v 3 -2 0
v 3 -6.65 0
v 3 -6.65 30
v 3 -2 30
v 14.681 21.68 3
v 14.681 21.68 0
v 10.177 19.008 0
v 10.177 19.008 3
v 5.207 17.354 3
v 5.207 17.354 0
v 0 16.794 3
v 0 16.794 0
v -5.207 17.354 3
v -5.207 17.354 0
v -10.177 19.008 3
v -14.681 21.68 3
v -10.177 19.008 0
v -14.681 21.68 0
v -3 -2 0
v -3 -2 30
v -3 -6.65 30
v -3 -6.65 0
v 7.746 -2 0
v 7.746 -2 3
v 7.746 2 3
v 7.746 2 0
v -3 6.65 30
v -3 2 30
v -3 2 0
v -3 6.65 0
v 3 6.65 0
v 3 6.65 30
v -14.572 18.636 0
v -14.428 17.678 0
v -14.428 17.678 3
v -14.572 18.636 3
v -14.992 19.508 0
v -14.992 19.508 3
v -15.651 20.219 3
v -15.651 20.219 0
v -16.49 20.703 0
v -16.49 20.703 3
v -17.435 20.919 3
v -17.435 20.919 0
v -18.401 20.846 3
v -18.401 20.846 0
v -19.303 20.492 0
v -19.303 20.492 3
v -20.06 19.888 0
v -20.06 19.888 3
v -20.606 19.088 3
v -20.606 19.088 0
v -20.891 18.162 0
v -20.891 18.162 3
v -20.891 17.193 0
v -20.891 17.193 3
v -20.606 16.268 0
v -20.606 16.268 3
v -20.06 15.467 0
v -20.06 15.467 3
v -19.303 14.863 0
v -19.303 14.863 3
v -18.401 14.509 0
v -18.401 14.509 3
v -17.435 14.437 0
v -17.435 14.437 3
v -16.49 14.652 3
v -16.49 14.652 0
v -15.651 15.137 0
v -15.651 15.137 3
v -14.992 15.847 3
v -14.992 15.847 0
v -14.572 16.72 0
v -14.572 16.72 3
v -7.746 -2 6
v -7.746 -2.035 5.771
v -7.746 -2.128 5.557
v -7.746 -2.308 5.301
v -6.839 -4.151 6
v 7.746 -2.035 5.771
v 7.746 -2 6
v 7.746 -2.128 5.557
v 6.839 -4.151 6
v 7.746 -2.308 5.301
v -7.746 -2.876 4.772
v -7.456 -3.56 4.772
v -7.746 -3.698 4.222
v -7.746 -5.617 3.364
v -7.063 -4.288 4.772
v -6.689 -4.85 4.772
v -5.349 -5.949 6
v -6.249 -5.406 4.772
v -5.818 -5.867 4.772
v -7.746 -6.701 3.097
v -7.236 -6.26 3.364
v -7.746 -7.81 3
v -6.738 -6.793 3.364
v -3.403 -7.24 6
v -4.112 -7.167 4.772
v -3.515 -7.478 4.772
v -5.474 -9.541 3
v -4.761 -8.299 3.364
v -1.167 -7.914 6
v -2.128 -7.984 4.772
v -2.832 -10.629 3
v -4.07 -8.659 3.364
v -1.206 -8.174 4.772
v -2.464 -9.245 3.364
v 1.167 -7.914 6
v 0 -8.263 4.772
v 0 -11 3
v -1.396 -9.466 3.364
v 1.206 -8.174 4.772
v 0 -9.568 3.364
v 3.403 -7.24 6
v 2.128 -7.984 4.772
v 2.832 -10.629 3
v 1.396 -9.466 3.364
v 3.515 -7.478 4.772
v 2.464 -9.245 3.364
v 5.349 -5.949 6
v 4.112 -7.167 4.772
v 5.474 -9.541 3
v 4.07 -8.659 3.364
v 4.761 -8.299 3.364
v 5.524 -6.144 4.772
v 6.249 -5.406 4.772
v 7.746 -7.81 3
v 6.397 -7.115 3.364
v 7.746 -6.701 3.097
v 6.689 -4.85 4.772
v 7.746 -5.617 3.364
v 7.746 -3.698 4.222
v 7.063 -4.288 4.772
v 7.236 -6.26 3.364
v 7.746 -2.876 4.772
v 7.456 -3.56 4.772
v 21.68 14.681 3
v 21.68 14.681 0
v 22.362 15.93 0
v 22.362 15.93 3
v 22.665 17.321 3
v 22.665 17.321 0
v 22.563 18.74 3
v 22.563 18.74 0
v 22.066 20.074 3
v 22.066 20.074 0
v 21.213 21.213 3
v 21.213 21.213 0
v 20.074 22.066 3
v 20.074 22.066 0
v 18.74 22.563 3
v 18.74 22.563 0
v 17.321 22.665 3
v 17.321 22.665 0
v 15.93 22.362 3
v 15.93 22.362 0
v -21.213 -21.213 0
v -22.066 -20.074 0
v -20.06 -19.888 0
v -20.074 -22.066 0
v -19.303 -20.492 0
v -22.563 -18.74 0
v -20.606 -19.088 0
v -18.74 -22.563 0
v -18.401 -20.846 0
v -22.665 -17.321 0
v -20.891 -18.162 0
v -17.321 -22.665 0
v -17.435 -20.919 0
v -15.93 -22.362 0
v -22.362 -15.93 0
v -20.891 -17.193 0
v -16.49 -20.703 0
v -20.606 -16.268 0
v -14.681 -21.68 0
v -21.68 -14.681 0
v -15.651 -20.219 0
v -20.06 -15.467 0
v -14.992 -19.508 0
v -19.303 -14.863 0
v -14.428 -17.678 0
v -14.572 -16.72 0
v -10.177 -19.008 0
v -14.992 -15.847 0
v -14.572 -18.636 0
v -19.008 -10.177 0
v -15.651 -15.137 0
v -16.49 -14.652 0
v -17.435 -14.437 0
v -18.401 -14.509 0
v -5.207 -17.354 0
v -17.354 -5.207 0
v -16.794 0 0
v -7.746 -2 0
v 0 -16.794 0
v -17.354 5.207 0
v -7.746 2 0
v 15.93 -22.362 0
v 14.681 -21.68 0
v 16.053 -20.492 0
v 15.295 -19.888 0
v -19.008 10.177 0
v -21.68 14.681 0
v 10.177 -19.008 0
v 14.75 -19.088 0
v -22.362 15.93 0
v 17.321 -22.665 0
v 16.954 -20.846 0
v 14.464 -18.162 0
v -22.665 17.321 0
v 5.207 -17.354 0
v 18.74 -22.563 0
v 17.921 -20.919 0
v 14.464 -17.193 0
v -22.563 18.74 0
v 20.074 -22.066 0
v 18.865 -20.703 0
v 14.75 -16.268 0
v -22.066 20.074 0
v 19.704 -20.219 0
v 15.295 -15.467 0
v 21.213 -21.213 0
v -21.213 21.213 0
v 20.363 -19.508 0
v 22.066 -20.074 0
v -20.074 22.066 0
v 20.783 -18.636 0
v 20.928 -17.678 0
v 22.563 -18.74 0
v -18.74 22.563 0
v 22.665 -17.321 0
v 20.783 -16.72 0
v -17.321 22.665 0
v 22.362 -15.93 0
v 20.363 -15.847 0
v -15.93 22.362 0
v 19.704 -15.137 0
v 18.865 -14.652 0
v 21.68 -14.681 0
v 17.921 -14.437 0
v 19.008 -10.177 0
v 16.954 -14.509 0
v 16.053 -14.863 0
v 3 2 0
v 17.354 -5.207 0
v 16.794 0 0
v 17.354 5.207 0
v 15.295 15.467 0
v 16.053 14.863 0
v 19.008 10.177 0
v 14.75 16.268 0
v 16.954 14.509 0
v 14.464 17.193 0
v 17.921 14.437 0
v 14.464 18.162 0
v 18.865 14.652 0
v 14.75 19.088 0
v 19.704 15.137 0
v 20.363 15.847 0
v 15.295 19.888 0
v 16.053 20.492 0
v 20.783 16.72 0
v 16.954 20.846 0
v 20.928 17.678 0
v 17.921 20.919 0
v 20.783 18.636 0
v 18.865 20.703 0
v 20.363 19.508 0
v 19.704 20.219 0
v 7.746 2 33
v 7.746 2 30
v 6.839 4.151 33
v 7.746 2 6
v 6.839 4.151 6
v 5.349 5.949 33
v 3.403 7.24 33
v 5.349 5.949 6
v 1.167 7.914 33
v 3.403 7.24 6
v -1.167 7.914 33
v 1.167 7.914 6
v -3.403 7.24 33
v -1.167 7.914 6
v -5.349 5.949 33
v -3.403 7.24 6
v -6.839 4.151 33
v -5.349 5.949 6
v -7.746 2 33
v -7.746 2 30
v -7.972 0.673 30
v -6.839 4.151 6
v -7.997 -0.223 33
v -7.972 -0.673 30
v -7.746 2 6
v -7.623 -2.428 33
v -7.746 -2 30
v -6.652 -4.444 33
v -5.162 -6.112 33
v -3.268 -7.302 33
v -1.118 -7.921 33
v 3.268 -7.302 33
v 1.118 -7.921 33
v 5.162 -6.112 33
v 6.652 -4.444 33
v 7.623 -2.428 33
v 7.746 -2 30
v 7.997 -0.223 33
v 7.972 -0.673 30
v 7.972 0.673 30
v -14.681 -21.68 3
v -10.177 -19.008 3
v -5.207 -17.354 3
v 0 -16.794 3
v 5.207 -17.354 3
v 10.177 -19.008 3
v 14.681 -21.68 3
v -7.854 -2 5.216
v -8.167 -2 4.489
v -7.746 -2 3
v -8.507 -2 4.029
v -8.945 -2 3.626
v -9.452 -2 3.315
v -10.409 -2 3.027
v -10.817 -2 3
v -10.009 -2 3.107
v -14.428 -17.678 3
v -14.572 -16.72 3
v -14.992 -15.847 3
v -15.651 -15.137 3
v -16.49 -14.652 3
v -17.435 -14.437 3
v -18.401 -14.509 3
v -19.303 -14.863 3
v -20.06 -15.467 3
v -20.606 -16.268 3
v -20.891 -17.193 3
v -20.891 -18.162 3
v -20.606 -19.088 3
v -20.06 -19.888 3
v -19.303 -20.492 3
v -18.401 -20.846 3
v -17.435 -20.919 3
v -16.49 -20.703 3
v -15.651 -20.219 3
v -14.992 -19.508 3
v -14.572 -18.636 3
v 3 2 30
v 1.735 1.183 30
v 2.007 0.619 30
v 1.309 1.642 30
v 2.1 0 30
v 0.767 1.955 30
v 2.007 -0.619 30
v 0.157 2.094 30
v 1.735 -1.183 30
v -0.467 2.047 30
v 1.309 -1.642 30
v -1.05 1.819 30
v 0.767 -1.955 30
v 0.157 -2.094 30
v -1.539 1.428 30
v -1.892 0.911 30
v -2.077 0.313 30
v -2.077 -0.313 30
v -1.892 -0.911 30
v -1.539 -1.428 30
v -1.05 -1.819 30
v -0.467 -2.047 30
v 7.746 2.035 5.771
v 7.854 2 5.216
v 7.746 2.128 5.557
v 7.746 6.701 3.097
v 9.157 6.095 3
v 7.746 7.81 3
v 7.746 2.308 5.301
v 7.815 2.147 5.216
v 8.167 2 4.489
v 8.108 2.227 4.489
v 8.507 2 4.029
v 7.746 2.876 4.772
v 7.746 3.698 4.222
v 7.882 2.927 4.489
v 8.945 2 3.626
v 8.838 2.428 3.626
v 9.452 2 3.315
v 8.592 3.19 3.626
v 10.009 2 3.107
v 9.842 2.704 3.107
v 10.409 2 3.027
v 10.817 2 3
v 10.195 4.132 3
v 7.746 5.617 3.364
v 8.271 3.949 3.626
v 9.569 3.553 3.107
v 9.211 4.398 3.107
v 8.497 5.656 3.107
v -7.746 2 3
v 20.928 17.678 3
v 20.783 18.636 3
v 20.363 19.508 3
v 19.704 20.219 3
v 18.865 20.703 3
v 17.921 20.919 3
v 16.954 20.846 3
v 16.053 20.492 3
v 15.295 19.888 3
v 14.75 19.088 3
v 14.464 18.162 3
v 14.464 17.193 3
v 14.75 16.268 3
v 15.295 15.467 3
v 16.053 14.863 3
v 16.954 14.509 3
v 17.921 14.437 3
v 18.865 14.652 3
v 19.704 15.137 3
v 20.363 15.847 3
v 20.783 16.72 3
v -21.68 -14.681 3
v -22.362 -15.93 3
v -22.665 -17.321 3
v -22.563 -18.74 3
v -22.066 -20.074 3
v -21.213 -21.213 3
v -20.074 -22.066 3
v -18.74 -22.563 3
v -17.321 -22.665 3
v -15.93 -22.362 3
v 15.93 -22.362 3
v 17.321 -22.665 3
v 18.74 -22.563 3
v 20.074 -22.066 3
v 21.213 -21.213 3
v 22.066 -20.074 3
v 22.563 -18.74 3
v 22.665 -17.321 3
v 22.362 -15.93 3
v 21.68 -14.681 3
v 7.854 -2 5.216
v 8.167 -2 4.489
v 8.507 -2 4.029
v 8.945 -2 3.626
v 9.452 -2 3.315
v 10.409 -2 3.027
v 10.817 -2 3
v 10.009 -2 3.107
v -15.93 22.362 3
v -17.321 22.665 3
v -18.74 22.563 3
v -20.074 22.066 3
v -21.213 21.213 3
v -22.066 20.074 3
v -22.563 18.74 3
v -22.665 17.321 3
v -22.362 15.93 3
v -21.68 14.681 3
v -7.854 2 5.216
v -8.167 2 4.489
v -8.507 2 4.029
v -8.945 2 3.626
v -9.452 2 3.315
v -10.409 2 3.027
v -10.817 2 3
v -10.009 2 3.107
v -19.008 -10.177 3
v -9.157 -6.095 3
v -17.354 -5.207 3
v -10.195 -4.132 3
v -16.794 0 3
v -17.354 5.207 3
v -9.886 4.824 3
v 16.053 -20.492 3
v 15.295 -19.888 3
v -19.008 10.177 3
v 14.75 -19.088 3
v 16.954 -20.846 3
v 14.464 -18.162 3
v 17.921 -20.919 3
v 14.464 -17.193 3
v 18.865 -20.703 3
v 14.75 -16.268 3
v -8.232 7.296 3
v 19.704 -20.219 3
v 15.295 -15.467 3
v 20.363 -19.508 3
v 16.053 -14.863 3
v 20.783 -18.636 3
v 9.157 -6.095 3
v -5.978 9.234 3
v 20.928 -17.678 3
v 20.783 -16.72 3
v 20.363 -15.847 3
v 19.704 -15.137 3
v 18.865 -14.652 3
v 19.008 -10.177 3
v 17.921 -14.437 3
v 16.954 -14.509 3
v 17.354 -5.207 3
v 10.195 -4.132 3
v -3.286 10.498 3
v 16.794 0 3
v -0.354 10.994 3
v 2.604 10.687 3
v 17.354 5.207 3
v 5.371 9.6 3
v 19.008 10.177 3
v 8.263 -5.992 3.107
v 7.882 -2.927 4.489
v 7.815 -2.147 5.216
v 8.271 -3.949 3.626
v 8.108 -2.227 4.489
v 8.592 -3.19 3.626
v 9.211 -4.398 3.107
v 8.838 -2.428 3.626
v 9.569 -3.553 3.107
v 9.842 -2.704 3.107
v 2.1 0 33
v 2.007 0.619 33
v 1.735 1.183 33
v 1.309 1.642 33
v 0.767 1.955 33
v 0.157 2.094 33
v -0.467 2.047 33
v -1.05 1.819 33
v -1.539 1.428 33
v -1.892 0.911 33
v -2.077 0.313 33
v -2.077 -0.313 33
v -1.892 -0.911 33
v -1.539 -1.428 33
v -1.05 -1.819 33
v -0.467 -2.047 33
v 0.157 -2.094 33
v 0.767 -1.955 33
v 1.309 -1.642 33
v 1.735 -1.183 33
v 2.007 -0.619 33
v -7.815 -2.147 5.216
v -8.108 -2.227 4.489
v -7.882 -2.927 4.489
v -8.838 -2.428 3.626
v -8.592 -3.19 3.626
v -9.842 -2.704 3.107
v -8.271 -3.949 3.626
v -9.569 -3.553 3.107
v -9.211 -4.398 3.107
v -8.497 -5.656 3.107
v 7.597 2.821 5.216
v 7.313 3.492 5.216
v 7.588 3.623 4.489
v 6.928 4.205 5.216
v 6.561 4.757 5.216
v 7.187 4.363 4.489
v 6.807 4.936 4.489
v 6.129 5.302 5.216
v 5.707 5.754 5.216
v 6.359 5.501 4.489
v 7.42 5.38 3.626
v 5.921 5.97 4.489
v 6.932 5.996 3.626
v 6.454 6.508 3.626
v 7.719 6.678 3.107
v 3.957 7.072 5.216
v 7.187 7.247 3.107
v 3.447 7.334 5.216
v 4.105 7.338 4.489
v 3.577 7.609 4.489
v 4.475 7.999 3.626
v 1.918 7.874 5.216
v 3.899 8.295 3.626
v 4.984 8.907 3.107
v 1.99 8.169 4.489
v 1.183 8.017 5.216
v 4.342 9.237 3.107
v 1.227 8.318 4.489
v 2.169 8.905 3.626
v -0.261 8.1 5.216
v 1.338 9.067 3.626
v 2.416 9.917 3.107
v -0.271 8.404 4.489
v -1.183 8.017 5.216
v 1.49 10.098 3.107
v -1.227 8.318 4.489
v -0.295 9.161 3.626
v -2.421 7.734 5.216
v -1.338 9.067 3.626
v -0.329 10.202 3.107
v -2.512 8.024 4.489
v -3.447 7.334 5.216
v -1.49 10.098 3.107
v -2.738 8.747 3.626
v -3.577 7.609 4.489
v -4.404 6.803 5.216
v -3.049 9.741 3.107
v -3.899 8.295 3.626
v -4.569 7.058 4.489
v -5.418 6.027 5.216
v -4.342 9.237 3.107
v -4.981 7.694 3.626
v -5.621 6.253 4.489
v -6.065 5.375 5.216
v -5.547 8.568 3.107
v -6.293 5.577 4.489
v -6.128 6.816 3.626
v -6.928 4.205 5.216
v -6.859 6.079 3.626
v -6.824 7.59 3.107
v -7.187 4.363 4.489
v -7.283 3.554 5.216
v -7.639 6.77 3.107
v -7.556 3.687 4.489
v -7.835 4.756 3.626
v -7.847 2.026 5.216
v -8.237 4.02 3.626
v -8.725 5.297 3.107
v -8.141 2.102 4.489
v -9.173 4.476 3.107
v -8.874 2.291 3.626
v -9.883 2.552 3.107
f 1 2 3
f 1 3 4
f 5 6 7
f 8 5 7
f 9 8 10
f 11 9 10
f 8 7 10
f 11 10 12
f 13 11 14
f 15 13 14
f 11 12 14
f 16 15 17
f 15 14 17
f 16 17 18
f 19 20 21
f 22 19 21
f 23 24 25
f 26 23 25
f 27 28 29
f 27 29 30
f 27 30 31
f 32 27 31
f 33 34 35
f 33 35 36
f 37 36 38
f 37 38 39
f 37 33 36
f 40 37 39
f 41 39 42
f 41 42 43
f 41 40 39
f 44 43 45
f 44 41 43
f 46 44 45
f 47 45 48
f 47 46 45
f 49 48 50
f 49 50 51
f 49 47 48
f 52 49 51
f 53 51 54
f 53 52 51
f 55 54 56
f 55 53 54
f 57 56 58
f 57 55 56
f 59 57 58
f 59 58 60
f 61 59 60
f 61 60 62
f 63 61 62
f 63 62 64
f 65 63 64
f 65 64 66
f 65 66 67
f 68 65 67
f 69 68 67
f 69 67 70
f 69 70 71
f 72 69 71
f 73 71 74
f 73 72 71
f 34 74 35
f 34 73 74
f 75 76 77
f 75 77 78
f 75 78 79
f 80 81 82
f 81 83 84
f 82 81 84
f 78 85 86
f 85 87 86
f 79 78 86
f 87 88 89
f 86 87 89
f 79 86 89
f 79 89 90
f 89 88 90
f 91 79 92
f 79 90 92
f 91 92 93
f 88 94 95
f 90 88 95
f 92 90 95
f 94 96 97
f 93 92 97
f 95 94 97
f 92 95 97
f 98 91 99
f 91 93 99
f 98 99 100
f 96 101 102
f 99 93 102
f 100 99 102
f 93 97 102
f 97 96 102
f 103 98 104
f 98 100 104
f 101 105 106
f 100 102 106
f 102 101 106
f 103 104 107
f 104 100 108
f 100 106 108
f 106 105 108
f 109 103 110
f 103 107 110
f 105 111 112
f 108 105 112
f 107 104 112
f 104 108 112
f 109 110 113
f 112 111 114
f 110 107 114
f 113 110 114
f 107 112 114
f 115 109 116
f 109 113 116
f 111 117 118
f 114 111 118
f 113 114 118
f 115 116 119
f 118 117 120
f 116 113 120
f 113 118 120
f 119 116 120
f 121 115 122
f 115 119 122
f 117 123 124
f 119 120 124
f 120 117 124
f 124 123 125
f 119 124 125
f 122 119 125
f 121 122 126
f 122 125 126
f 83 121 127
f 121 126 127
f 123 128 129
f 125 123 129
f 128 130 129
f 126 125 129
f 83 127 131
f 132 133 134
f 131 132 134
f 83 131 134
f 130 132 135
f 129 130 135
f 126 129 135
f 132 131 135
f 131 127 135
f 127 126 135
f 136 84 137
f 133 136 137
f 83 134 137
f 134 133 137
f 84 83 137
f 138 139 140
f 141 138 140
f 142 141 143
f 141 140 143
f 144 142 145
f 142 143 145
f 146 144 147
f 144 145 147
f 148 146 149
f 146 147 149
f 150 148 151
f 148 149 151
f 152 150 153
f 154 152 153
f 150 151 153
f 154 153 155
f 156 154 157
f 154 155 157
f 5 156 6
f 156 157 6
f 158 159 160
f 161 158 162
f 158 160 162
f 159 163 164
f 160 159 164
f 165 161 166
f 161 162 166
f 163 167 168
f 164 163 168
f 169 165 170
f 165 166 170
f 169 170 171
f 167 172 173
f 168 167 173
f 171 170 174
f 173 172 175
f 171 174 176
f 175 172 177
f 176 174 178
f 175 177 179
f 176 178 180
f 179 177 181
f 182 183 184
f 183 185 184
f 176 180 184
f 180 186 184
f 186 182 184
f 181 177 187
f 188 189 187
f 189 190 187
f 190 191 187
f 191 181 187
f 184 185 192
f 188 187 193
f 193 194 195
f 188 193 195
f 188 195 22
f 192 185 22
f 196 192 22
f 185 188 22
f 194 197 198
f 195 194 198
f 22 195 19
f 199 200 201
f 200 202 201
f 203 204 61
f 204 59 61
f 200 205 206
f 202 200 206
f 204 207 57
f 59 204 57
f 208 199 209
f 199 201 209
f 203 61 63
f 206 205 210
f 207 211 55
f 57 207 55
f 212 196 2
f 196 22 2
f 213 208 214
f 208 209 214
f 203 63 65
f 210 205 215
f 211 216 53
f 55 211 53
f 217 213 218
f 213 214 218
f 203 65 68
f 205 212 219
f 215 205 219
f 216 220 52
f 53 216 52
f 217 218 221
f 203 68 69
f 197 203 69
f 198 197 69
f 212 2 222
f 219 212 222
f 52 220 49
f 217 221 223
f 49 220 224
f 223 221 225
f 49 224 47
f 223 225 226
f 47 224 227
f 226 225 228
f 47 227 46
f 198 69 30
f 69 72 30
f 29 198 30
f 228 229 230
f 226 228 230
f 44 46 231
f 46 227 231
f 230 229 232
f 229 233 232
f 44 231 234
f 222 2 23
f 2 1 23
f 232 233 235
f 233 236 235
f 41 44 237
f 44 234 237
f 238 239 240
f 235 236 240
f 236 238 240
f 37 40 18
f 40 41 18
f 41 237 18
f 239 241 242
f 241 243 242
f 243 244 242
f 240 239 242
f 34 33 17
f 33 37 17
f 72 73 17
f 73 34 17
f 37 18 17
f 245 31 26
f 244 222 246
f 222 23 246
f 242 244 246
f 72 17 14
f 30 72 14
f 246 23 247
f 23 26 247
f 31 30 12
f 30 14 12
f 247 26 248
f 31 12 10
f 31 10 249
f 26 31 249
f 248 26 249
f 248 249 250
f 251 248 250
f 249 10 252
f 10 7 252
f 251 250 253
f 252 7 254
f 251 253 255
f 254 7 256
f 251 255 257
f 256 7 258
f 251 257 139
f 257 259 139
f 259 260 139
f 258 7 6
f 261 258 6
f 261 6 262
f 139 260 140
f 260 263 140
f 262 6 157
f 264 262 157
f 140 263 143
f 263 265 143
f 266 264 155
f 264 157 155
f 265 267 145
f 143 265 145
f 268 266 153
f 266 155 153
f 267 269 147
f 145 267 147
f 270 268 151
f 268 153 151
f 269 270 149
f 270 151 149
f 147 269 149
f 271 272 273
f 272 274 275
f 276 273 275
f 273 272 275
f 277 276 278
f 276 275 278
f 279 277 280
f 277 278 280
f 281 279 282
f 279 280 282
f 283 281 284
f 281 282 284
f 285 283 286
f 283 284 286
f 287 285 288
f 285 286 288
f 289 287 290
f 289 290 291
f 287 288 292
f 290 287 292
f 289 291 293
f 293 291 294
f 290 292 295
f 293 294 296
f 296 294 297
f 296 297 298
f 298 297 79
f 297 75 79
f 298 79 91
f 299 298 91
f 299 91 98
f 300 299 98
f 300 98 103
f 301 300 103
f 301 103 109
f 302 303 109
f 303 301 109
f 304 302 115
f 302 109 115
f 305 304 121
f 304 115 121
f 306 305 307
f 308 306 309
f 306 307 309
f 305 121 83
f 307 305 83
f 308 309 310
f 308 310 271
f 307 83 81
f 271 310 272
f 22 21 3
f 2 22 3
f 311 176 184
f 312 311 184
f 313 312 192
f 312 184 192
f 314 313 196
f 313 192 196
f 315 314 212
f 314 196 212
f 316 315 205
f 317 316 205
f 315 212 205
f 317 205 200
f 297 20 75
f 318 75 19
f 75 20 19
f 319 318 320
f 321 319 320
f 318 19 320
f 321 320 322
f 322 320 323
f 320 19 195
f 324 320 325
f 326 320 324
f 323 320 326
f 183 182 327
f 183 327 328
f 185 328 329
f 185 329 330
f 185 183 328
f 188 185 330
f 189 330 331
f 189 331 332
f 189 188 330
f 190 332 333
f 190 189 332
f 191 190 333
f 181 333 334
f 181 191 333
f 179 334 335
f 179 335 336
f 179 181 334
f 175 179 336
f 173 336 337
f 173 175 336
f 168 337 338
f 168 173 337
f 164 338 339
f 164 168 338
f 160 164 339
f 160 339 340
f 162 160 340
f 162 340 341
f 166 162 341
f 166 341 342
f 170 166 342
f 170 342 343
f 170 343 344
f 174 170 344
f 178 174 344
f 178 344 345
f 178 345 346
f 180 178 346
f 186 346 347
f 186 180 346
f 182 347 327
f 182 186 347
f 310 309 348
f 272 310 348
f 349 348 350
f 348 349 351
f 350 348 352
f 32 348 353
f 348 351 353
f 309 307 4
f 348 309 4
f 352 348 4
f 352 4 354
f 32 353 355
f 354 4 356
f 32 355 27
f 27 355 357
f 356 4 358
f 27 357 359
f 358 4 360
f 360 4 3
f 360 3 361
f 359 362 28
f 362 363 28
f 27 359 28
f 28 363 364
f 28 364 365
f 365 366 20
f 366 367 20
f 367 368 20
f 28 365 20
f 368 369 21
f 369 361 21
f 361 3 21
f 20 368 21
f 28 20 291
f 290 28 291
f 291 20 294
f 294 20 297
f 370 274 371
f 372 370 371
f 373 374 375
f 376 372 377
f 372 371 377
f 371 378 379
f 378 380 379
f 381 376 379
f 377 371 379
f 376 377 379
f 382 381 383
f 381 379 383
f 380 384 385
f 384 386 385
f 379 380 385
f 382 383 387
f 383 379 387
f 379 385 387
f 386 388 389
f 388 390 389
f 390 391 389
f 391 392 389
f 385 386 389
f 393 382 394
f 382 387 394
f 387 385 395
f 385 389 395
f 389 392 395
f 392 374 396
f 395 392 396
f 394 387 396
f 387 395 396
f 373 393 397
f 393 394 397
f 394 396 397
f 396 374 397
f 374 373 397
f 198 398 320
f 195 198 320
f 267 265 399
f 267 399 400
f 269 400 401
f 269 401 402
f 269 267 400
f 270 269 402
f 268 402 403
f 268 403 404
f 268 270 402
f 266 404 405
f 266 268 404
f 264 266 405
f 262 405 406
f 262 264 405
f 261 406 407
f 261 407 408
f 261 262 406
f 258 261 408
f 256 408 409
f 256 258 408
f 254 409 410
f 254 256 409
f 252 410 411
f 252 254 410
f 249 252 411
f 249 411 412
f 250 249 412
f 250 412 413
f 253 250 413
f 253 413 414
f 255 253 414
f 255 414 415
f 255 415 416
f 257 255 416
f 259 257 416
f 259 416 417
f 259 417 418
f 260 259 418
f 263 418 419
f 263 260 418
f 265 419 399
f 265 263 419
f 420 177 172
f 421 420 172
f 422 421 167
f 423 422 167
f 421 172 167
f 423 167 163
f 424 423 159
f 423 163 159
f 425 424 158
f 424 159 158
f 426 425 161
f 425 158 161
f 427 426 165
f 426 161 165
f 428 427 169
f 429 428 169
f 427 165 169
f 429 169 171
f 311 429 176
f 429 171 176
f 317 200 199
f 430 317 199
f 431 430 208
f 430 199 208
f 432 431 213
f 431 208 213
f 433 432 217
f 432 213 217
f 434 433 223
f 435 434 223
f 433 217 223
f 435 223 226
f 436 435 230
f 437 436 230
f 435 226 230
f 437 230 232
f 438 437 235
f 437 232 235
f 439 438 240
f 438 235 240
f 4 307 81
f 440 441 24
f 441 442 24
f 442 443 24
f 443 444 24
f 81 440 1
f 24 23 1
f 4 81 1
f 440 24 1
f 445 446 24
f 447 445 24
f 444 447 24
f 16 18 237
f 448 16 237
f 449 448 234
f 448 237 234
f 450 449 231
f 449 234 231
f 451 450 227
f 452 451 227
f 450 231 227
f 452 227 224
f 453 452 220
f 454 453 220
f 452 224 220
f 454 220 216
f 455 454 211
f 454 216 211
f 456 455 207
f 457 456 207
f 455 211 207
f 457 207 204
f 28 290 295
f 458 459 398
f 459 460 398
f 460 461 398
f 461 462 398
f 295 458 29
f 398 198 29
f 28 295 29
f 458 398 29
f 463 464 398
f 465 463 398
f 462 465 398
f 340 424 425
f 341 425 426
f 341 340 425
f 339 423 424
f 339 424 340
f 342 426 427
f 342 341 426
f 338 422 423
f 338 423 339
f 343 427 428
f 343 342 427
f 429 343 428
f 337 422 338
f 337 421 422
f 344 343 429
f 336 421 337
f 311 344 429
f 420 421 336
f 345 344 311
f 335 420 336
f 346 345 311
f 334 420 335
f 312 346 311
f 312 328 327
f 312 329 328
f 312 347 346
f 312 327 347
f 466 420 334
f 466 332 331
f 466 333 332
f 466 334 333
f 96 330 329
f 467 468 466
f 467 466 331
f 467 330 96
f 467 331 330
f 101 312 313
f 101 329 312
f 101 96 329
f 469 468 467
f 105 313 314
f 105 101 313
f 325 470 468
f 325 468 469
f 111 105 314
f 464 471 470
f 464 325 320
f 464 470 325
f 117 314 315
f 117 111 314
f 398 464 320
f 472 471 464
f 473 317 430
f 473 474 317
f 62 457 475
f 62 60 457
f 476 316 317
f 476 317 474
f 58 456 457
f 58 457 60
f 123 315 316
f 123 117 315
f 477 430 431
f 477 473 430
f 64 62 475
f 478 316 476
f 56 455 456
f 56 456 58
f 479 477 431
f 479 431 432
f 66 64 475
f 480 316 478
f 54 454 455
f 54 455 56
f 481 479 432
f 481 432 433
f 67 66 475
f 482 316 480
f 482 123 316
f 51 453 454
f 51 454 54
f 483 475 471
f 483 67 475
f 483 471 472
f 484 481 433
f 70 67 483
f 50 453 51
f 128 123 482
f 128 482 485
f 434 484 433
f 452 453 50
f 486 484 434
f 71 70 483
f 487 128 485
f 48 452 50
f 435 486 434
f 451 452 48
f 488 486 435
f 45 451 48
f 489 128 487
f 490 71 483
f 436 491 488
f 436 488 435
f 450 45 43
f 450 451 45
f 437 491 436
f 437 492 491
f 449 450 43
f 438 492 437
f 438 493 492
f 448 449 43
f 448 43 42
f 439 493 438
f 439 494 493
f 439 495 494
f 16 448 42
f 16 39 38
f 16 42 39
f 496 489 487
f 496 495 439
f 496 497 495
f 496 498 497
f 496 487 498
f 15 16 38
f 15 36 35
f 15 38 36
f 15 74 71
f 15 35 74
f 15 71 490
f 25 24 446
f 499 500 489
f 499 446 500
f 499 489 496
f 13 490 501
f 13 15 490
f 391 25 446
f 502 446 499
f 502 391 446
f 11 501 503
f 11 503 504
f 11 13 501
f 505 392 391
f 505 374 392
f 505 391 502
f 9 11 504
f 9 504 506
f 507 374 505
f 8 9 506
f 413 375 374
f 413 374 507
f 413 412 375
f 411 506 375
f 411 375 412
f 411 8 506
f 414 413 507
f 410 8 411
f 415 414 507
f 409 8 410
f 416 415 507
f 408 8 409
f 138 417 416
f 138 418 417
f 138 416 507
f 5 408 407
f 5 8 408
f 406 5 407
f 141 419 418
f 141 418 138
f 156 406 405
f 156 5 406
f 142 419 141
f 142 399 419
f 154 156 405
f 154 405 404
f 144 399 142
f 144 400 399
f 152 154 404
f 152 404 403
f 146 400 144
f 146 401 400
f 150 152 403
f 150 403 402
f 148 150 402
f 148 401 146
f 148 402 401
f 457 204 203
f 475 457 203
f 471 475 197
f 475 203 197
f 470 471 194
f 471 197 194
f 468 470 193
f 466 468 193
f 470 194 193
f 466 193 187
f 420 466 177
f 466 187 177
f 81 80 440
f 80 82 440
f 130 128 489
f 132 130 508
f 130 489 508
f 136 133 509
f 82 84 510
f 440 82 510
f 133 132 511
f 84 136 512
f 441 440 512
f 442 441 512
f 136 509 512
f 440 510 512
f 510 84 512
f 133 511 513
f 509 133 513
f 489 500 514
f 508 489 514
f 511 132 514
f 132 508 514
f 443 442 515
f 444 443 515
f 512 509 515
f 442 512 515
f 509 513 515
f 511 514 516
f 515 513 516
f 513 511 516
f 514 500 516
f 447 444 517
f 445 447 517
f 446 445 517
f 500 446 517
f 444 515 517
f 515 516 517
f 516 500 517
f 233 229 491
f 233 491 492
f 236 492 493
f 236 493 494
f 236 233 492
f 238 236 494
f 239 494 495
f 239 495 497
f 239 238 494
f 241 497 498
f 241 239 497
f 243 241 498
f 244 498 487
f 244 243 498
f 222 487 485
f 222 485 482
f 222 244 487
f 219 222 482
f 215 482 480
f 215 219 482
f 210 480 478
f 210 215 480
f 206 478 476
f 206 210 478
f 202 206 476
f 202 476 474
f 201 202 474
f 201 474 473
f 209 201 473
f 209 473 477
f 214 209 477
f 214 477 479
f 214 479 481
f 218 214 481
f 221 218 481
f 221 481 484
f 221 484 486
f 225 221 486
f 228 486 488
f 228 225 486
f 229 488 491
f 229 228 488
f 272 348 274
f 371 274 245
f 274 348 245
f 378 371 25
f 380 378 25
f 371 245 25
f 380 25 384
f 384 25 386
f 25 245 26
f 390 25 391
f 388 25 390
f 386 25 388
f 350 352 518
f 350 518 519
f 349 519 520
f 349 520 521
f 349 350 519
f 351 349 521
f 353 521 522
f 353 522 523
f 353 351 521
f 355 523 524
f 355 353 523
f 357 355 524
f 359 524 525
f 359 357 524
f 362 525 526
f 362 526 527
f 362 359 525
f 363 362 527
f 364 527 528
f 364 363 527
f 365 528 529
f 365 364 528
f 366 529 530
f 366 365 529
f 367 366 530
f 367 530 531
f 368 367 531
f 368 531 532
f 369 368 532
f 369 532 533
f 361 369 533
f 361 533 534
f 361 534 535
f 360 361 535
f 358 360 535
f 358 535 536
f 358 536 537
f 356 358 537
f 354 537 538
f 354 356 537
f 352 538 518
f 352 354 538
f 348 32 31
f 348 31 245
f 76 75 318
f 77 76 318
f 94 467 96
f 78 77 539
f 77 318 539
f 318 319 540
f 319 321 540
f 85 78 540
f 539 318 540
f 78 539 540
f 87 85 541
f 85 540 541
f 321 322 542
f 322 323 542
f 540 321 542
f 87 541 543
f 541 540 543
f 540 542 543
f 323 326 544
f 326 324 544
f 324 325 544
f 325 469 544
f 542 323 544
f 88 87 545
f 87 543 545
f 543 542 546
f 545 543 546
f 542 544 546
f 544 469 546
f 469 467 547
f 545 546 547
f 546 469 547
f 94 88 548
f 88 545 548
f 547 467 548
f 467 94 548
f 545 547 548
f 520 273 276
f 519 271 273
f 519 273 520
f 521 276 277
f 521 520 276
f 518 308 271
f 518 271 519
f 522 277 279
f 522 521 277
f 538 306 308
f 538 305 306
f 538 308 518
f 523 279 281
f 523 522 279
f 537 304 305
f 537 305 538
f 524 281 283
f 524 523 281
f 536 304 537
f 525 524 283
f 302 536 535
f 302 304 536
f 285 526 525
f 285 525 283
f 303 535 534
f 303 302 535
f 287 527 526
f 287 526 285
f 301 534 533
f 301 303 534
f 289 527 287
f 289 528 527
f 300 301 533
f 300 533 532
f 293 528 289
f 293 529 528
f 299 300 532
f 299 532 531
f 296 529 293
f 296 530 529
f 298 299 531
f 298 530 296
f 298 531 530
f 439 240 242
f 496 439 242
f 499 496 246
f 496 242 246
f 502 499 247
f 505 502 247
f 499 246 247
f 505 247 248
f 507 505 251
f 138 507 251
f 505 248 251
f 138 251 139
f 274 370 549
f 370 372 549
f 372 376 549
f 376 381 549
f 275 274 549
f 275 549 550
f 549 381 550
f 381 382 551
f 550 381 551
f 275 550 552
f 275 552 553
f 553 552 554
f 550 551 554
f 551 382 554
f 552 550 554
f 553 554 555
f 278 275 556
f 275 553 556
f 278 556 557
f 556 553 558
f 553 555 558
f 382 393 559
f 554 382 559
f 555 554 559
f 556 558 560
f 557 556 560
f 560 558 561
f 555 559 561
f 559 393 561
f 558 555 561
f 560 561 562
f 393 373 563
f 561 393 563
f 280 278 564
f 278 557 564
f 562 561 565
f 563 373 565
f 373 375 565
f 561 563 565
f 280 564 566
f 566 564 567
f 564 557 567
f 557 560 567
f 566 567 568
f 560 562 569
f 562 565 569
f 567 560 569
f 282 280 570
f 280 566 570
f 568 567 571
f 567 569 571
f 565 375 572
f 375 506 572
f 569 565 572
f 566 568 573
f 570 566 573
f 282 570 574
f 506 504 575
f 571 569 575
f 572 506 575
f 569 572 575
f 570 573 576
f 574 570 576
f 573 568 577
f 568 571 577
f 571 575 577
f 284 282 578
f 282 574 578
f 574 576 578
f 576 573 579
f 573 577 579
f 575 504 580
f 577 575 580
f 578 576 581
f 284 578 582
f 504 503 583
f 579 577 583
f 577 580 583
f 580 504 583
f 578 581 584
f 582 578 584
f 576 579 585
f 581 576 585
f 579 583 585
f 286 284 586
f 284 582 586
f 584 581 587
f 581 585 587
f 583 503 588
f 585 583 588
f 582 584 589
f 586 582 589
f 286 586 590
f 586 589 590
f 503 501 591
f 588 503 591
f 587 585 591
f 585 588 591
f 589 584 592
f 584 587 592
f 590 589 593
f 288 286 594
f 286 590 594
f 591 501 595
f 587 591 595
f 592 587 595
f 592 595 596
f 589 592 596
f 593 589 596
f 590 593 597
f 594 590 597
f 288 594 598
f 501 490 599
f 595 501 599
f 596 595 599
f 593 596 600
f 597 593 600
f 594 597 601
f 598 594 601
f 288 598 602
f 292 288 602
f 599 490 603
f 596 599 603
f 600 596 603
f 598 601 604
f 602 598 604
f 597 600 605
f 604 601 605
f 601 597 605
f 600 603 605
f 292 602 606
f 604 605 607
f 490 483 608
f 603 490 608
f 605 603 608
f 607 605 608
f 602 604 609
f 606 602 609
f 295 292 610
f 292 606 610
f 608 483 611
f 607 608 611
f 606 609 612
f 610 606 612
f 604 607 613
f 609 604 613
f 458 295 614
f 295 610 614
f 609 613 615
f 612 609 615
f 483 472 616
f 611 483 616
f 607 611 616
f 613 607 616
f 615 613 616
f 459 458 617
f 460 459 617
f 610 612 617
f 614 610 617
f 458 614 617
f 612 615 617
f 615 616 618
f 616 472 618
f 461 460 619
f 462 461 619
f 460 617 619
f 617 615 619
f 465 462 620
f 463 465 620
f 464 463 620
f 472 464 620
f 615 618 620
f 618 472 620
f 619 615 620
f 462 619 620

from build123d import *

# Parameters (mm, degrees)
CROQUIS1_R              = 3.2499999999997446
CROQUIS1_R_2            = 3.249999999997429
CROQUIS1_R_3            = 3.249999999998684
SALIENTE_EXTRUIR1_DEPTH = 3
CORTAR_EXTRUIR2_REACH   = 34.211
SALIENTE_EXTRUIR2_DEPTH = 30
SALIENTE_EXTRUIR3_START = -3
CROQUIS4_R              = 8.000000000001583
CROQUIS4_R_2            = 2.1
SALIENTE_EXTRUIR3_DEPTH = 3
REDONDEO1_R             = 3


with BuildPart() as part:
    # Croquis1 → Saliente-Extruir1 (new body)
    with BuildSketch(Plane.XY):
        with BuildLine():
            ThreePointArc((-14.681197845286842, 21.680313336544412), (-21.21320343559782, 21.213203435599436), (-21.680313336542973, 14.681197845289143))
            ThreePointArc((-21.680313336542973, 14.681197845289143), (-16.79377171834698, -4.4873e-13), (-21.680313336546256, -14.681197845289011))
            ThreePointArc((-21.680313336546256, -14.681197845289011), (-21.213203435602523, -21.213203435600768), (-14.68119784529118, -21.680313336546952))
            ThreePointArc((-14.68119784529118, -21.680313336546952), (-1.37456e-12, -16.793771718350733), (14.681197845287352, -21.68031333655022))
            ThreePointArc((14.681197845287352, -21.68031333655022), (21.21320343559837, -21.213203435605198), (21.680313336544117, -14.68119784529431))
            ThreePointArc((21.680313336544117, -14.68119784529431), (16.79377171834798, -4.8379e-12), (21.680313336547112, 14.681197845283641))
            ThreePointArc((21.680313336547112, 14.681197845283641), (21.213203435602864, 21.21320343559648), (14.681197845291681, 21.680313336541143))
            ThreePointArc((14.681197845291681, 21.680313336541143), (1.87813e-12, 16.793771718344924), (-14.681197845286842, 21.680313336544412))
        make_face()
        with Locations((-17.677669529663632, 17.677669529664712)):
            Circle(CROQUIS1_R, mode=Mode.SUBTRACT)
        with Locations((17.67766952966688, 17.677669529661795)):
            Circle(CROQUIS1_R_2, mode=Mode.SUBTRACT)
        with Locations((17.67766952966414, -17.677669529670524)):
            Circle(CROQUIS1_R_3, mode=Mode.SUBTRACT)
        with Locations((-17.677669529667213, -17.677669529666943)):
            Circle(CROQUIS1_R, mode=Mode.SUBTRACT)
    extrude(amount=SALIENTE_EXTRUIR1_DEPTH)

    # Croquis2 → Cortar-Extruir2 (cut, up to next)
    with BuildSketch(Plane.XY.offset(3), mode=Mode.PRIVATE) as cortar_extruir2_sk1:
        Polygon((3.0000001045733526, -6.64999997299992), (3.000000062696712, -2.0000000028022047), (7.7459667027131305, -1.9999999600613383), (7.745966666690224, 2.00000009954332), (3.000000026673777, 2.000000056802398), (2.999999984797136, 6.650000027000114), (-3.0000001046098235, 6.649999972965725), (-3.000000062733182, 2.00000000276801), (-7.745966702749602, 1.9999999600271434), (-7.7459666821165225, -2.00000003997286), (-3.000000026710248, -1.9999999972319937), (-2.9999999848336065, -6.6500000270343085), align=None)
    cortar_extruir2_tool1 = extrude(cortar_extruir2_sk1.sketch, amount=-CORTAR_EXTRUIR2_REACH, mode=Mode.PRIVATE) & part.part
    add(cortar_extruir2_tool1.solids().sort_by_distance((0, 0, 3))[0], mode=Mode.SUBTRACT)

    # Croquis3 → Saliente-Extruir2 (add)
    with BuildSketch(Plane.XY.offset(3)):
        with BuildLine():
            Line((3.000000026673777, 2.000000056802398), (7.745966666690224, 2.00000009954332))
            ThreePointArc((7.7459666667244, 2.000000099552144), (-7.205040071e-08, 8.000000000013381), (-7.745966702749601, 1.9999999600271456))
            Line((-7.745966702749602, 1.9999999600271434), (-3.000000062733182, 2.00000000276801))
            Line((-3.000000062733182, 2.00000000276801), (-3.0000001046098235, 6.649999972965725))
            Line((-3.000000104609824, 6.649999972965725), (2.999999984797136, 6.650000027000114))
            Line((2.999999984797136, 6.650000027000113), (3.000000026673777, 2.000000056802398))
        make_face()
        with BuildLine():
            Line((3.000000062696712, -2.0000000028022047), (3.0000001045733526, -6.64999997299992))
            Line((3.0000001045733526, -6.64999997299992), (-2.9999999848336065, -6.6500000270343085))
            Line((-2.9999999848336065, -6.6500000270343085), (-3.000000026710248, -1.9999999972319937))
            Line((-3.0000000267102482, -1.9999999972319937), (-7.7459666821165225, -2.00000003997286))
            ThreePointArc((-7.745966682108257, -2.000000039970724), (4.126157047e-08, -8.000000000013381), (7.745966702739044, -1.9999999600680332))
            Line((7.7459667027131305, -1.9999999600613383), (3.000000062696712, -2.0000000028022047))
        make_face()
    extrude(amount=SALIENTE_EXTRUIR2_DEPTH)

    # Croquis4 → Saliente-Extruir3 (add)
    with BuildSketch(Plane.XY.offset(33).offset(SALIENTE_EXTRUIR3_START)):
        with Locations(Location((0, 0, 0), (0, 0, 165.52248811))):
            Circle(CROQUIS4_R)
        Circle(CROQUIS4_R_2, mode=Mode.SUBTRACT)
    extrude(amount=SALIENTE_EXTRUIR3_DEPTH)

    # Redondeo1
    # the kernel refuses this fillet: 3 mm, written as the material it adds along each edge
    with BuildSketch(Plane(origin=(4.4e-16, 4.4e-16, 3), x_dir=(-0.22595414891367588, 0.9741379381733866, 0), z_dir=(0.9741379381733866, 0.22595414891367588, 0))) as redondeo1_piece_1_section:
        with BuildLine():
            CenterArc((8.000000000013381 + REDONDEO1_R, REDONDEO1_R), REDONDEO1_R, 180, 90)
            Line((8.000000000013383, REDONDEO1_R), (8.000000000013381, 0))
            Line((8.000000000013381, 0), (8.000000000013381 + REDONDEO1_R, 0))
        make_face()
    redondeo1_piece_1 = revolve(axis=Axis((4.4e-16, 4.4e-16, 3), (0, 0, 1)), revolution_arc=333.88201682059855, mode=Mode.PRIVATE)
    redondeo1_piece_1 = split(redondeo1_piece_1, bisect_by=Plane(origin=(-7.745966692433063, -3.99557857e-08, 3), z_dir=(1.0, 5.158269811289524e-09, 0)), keep=Keep.TOP, mode=Mode.PRIVATE)
    redondeo1_piece_1 = split(redondeo1_piece_1, bisect_by=Plane(origin=(7.745966684701678, 6.975805769e-08, 3), z_dir=(-1.0, -9.005726474694729e-09, 0)), keep=Keep.TOP, mode=Mode.PRIVATE)
    add(redondeo1_piece_1)
    with BuildSketch(Plane(origin=(4.4e-16, 4.4e-16, 3), x_dir=(-0.22595414891367588, 0.9741379381733866, 0), z_dir=(0.9741379381733866, 0.22595414891367588, 0))) as redondeo1_piece_2_section:
        with BuildLine():
            CenterArc((8.000000000013381 + REDONDEO1_R, REDONDEO1_R), REDONDEO1_R, 180, 90)
            Line((8.000000000013383, REDONDEO1_R), (8.000000000013381, 0))
            Line((8.000000000013381, 0), (8.000000000013381 + REDONDEO1_R, 0))
        make_face()
    redondeo1_piece_2 = revolve(axis=Axis((4.4e-16, 4.4e-16, 3), (0, 0, 1)), revolution_arc=333.88201682059855, mode=Mode.PRIVATE)
    redondeo1_piece_2 = split(redondeo1_piece_2, bisect_by=Plane(origin=(-1.801144813e-08, 2.0000000297851828, 3), z_dir=(-9.005724153490957e-09, 1.0, 0)), keep=Keep.TOP, mode=Mode.PRIVATE)
    add(redondeo1_piece_2)
    with BuildSketch(Plane(origin=(4.4e-16, 4.4e-16, 3), x_dir=(-0.22595414891367588, 0.9741379381733866, 0), z_dir=(0.9741379381733866, 0.22595414891367588, 0))) as redondeo1_piece_3_section:
        with BuildLine():
            CenterArc((8.000000000013381 + REDONDEO1_R, REDONDEO1_R), REDONDEO1_R, 180, 90)
            Line((8.000000000013383, REDONDEO1_R), (8.000000000013381, 0))
            Line((8.000000000013381, 0), (8.000000000013381 + REDONDEO1_R, 0))
        make_face()
    redondeo1_piece_3 = revolve(axis=Axis((4.4e-16, 4.4e-16, 3), (0, 0, 1)), revolution_arc=333.88201682059855, mode=Mode.PRIVATE)
    redondeo1_piece_3 = split(redondeo1_piece_3, bisect_by=Plane(origin=(1.801144902e-08, -2.0000000298193776, 3), z_dir=(9.005724153490959e-09, -1.0, 0)), keep=Keep.TOP, mode=Mode.PRIVATE)
    add(redondeo1_piece_3)
    with BuildSketch(Plane(origin=(0, -4.4e-16, 3), x_dir=(0.22595415641693267, -0.9741379364329841, 0), z_dir=(-0.9741379364329841, -0.22595415641693267, 0))) as redondeo1_piece_4_section:
        with BuildLine():
            CenterArc((8.000000000013381 + REDONDEO1_R, REDONDEO1_R), REDONDEO1_R, 180, 90)
            Line((8.000000000013381, REDONDEO1_R), (8.000000000013381, 0))
            Line((8.000000000013381, 0), (8.000000000013381 + REDONDEO1_R, 0))
        make_face()
    redondeo1_piece_4 = revolve(axis=Axis((0, -4.4e-16, 3), (0, 0, 1)), revolution_arc=333.8820163789793, mode=Mode.PRIVATE)
    redondeo1_piece_4 = split(redondeo1_piece_4, bisect_by=Plane(origin=(-7.745966692433063, -3.995578659e-08, 3), z_dir=(1.0, 5.158269811289524e-09, 0)), keep=Keep.TOP, mode=Mode.PRIVATE)
    redondeo1_piece_4 = split(redondeo1_piece_4, bisect_by=Plane(origin=(7.745966684701678, 6.97580568e-08, 3), z_dir=(-1.0, -9.005726474694729e-09, 0)), keep=Keep.TOP, mode=Mode.PRIVATE)
    add(redondeo1_piece_4)
    with BuildSketch(Plane(origin=(0, -4.4e-16, 3), x_dir=(0.22595415641693267, -0.9741379364329841, 0), z_dir=(-0.9741379364329841, -0.22595415641693267, 0))) as redondeo1_piece_5_section:
        with BuildLine():
            CenterArc((8.000000000013381 + REDONDEO1_R, REDONDEO1_R), REDONDEO1_R, 180, 90)
            Line((8.000000000013381, REDONDEO1_R), (8.000000000013381, 0))
            Line((8.000000000013381, 0), (8.000000000013381 + REDONDEO1_R, 0))
        make_face()
    redondeo1_piece_5 = revolve(axis=Axis((0, -4.4e-16, 3), (0, 0, 1)), revolution_arc=333.8820163789793, mode=Mode.PRIVATE)
    redondeo1_piece_5 = split(redondeo1_piece_5, bisect_by=Plane(origin=(1.801144858e-08, -2.0000000298193776, 3), z_dir=(9.005724153490959e-09, -1.0, 0)), keep=Keep.TOP, mode=Mode.PRIVATE)
    add(redondeo1_piece_5)
    with BuildSketch(Plane(origin=(0, -4.4e-16, 3), x_dir=(0.22595415641693267, -0.9741379364329841, 0), z_dir=(-0.9741379364329841, -0.22595415641693267, 0))) as redondeo1_piece_6_section:
        with BuildLine():
            CenterArc((8.000000000013381 + REDONDEO1_R, REDONDEO1_R), REDONDEO1_R, 180, 90)
            Line((8.000000000013381, REDONDEO1_R), (8.000000000013381, 0))
            Line((8.000000000013381, 0), (8.000000000013381 + REDONDEO1_R, 0))
        make_face()
    redondeo1_piece_6 = revolve(axis=Axis((0, -4.4e-16, 3), (0, 0, 1)), revolution_arc=333.8820163789793, mode=Mode.PRIVATE)
    redondeo1_piece_6 = split(redondeo1_piece_6, bisect_by=Plane(origin=(-1.801144858e-08, 2.0000000297851828, 3), z_dir=(-9.005724153490957e-09, 1.0, 0)), keep=Keep.TOP, mode=Mode.PRIVATE)
    add(redondeo1_piece_6)


solid = part.part
